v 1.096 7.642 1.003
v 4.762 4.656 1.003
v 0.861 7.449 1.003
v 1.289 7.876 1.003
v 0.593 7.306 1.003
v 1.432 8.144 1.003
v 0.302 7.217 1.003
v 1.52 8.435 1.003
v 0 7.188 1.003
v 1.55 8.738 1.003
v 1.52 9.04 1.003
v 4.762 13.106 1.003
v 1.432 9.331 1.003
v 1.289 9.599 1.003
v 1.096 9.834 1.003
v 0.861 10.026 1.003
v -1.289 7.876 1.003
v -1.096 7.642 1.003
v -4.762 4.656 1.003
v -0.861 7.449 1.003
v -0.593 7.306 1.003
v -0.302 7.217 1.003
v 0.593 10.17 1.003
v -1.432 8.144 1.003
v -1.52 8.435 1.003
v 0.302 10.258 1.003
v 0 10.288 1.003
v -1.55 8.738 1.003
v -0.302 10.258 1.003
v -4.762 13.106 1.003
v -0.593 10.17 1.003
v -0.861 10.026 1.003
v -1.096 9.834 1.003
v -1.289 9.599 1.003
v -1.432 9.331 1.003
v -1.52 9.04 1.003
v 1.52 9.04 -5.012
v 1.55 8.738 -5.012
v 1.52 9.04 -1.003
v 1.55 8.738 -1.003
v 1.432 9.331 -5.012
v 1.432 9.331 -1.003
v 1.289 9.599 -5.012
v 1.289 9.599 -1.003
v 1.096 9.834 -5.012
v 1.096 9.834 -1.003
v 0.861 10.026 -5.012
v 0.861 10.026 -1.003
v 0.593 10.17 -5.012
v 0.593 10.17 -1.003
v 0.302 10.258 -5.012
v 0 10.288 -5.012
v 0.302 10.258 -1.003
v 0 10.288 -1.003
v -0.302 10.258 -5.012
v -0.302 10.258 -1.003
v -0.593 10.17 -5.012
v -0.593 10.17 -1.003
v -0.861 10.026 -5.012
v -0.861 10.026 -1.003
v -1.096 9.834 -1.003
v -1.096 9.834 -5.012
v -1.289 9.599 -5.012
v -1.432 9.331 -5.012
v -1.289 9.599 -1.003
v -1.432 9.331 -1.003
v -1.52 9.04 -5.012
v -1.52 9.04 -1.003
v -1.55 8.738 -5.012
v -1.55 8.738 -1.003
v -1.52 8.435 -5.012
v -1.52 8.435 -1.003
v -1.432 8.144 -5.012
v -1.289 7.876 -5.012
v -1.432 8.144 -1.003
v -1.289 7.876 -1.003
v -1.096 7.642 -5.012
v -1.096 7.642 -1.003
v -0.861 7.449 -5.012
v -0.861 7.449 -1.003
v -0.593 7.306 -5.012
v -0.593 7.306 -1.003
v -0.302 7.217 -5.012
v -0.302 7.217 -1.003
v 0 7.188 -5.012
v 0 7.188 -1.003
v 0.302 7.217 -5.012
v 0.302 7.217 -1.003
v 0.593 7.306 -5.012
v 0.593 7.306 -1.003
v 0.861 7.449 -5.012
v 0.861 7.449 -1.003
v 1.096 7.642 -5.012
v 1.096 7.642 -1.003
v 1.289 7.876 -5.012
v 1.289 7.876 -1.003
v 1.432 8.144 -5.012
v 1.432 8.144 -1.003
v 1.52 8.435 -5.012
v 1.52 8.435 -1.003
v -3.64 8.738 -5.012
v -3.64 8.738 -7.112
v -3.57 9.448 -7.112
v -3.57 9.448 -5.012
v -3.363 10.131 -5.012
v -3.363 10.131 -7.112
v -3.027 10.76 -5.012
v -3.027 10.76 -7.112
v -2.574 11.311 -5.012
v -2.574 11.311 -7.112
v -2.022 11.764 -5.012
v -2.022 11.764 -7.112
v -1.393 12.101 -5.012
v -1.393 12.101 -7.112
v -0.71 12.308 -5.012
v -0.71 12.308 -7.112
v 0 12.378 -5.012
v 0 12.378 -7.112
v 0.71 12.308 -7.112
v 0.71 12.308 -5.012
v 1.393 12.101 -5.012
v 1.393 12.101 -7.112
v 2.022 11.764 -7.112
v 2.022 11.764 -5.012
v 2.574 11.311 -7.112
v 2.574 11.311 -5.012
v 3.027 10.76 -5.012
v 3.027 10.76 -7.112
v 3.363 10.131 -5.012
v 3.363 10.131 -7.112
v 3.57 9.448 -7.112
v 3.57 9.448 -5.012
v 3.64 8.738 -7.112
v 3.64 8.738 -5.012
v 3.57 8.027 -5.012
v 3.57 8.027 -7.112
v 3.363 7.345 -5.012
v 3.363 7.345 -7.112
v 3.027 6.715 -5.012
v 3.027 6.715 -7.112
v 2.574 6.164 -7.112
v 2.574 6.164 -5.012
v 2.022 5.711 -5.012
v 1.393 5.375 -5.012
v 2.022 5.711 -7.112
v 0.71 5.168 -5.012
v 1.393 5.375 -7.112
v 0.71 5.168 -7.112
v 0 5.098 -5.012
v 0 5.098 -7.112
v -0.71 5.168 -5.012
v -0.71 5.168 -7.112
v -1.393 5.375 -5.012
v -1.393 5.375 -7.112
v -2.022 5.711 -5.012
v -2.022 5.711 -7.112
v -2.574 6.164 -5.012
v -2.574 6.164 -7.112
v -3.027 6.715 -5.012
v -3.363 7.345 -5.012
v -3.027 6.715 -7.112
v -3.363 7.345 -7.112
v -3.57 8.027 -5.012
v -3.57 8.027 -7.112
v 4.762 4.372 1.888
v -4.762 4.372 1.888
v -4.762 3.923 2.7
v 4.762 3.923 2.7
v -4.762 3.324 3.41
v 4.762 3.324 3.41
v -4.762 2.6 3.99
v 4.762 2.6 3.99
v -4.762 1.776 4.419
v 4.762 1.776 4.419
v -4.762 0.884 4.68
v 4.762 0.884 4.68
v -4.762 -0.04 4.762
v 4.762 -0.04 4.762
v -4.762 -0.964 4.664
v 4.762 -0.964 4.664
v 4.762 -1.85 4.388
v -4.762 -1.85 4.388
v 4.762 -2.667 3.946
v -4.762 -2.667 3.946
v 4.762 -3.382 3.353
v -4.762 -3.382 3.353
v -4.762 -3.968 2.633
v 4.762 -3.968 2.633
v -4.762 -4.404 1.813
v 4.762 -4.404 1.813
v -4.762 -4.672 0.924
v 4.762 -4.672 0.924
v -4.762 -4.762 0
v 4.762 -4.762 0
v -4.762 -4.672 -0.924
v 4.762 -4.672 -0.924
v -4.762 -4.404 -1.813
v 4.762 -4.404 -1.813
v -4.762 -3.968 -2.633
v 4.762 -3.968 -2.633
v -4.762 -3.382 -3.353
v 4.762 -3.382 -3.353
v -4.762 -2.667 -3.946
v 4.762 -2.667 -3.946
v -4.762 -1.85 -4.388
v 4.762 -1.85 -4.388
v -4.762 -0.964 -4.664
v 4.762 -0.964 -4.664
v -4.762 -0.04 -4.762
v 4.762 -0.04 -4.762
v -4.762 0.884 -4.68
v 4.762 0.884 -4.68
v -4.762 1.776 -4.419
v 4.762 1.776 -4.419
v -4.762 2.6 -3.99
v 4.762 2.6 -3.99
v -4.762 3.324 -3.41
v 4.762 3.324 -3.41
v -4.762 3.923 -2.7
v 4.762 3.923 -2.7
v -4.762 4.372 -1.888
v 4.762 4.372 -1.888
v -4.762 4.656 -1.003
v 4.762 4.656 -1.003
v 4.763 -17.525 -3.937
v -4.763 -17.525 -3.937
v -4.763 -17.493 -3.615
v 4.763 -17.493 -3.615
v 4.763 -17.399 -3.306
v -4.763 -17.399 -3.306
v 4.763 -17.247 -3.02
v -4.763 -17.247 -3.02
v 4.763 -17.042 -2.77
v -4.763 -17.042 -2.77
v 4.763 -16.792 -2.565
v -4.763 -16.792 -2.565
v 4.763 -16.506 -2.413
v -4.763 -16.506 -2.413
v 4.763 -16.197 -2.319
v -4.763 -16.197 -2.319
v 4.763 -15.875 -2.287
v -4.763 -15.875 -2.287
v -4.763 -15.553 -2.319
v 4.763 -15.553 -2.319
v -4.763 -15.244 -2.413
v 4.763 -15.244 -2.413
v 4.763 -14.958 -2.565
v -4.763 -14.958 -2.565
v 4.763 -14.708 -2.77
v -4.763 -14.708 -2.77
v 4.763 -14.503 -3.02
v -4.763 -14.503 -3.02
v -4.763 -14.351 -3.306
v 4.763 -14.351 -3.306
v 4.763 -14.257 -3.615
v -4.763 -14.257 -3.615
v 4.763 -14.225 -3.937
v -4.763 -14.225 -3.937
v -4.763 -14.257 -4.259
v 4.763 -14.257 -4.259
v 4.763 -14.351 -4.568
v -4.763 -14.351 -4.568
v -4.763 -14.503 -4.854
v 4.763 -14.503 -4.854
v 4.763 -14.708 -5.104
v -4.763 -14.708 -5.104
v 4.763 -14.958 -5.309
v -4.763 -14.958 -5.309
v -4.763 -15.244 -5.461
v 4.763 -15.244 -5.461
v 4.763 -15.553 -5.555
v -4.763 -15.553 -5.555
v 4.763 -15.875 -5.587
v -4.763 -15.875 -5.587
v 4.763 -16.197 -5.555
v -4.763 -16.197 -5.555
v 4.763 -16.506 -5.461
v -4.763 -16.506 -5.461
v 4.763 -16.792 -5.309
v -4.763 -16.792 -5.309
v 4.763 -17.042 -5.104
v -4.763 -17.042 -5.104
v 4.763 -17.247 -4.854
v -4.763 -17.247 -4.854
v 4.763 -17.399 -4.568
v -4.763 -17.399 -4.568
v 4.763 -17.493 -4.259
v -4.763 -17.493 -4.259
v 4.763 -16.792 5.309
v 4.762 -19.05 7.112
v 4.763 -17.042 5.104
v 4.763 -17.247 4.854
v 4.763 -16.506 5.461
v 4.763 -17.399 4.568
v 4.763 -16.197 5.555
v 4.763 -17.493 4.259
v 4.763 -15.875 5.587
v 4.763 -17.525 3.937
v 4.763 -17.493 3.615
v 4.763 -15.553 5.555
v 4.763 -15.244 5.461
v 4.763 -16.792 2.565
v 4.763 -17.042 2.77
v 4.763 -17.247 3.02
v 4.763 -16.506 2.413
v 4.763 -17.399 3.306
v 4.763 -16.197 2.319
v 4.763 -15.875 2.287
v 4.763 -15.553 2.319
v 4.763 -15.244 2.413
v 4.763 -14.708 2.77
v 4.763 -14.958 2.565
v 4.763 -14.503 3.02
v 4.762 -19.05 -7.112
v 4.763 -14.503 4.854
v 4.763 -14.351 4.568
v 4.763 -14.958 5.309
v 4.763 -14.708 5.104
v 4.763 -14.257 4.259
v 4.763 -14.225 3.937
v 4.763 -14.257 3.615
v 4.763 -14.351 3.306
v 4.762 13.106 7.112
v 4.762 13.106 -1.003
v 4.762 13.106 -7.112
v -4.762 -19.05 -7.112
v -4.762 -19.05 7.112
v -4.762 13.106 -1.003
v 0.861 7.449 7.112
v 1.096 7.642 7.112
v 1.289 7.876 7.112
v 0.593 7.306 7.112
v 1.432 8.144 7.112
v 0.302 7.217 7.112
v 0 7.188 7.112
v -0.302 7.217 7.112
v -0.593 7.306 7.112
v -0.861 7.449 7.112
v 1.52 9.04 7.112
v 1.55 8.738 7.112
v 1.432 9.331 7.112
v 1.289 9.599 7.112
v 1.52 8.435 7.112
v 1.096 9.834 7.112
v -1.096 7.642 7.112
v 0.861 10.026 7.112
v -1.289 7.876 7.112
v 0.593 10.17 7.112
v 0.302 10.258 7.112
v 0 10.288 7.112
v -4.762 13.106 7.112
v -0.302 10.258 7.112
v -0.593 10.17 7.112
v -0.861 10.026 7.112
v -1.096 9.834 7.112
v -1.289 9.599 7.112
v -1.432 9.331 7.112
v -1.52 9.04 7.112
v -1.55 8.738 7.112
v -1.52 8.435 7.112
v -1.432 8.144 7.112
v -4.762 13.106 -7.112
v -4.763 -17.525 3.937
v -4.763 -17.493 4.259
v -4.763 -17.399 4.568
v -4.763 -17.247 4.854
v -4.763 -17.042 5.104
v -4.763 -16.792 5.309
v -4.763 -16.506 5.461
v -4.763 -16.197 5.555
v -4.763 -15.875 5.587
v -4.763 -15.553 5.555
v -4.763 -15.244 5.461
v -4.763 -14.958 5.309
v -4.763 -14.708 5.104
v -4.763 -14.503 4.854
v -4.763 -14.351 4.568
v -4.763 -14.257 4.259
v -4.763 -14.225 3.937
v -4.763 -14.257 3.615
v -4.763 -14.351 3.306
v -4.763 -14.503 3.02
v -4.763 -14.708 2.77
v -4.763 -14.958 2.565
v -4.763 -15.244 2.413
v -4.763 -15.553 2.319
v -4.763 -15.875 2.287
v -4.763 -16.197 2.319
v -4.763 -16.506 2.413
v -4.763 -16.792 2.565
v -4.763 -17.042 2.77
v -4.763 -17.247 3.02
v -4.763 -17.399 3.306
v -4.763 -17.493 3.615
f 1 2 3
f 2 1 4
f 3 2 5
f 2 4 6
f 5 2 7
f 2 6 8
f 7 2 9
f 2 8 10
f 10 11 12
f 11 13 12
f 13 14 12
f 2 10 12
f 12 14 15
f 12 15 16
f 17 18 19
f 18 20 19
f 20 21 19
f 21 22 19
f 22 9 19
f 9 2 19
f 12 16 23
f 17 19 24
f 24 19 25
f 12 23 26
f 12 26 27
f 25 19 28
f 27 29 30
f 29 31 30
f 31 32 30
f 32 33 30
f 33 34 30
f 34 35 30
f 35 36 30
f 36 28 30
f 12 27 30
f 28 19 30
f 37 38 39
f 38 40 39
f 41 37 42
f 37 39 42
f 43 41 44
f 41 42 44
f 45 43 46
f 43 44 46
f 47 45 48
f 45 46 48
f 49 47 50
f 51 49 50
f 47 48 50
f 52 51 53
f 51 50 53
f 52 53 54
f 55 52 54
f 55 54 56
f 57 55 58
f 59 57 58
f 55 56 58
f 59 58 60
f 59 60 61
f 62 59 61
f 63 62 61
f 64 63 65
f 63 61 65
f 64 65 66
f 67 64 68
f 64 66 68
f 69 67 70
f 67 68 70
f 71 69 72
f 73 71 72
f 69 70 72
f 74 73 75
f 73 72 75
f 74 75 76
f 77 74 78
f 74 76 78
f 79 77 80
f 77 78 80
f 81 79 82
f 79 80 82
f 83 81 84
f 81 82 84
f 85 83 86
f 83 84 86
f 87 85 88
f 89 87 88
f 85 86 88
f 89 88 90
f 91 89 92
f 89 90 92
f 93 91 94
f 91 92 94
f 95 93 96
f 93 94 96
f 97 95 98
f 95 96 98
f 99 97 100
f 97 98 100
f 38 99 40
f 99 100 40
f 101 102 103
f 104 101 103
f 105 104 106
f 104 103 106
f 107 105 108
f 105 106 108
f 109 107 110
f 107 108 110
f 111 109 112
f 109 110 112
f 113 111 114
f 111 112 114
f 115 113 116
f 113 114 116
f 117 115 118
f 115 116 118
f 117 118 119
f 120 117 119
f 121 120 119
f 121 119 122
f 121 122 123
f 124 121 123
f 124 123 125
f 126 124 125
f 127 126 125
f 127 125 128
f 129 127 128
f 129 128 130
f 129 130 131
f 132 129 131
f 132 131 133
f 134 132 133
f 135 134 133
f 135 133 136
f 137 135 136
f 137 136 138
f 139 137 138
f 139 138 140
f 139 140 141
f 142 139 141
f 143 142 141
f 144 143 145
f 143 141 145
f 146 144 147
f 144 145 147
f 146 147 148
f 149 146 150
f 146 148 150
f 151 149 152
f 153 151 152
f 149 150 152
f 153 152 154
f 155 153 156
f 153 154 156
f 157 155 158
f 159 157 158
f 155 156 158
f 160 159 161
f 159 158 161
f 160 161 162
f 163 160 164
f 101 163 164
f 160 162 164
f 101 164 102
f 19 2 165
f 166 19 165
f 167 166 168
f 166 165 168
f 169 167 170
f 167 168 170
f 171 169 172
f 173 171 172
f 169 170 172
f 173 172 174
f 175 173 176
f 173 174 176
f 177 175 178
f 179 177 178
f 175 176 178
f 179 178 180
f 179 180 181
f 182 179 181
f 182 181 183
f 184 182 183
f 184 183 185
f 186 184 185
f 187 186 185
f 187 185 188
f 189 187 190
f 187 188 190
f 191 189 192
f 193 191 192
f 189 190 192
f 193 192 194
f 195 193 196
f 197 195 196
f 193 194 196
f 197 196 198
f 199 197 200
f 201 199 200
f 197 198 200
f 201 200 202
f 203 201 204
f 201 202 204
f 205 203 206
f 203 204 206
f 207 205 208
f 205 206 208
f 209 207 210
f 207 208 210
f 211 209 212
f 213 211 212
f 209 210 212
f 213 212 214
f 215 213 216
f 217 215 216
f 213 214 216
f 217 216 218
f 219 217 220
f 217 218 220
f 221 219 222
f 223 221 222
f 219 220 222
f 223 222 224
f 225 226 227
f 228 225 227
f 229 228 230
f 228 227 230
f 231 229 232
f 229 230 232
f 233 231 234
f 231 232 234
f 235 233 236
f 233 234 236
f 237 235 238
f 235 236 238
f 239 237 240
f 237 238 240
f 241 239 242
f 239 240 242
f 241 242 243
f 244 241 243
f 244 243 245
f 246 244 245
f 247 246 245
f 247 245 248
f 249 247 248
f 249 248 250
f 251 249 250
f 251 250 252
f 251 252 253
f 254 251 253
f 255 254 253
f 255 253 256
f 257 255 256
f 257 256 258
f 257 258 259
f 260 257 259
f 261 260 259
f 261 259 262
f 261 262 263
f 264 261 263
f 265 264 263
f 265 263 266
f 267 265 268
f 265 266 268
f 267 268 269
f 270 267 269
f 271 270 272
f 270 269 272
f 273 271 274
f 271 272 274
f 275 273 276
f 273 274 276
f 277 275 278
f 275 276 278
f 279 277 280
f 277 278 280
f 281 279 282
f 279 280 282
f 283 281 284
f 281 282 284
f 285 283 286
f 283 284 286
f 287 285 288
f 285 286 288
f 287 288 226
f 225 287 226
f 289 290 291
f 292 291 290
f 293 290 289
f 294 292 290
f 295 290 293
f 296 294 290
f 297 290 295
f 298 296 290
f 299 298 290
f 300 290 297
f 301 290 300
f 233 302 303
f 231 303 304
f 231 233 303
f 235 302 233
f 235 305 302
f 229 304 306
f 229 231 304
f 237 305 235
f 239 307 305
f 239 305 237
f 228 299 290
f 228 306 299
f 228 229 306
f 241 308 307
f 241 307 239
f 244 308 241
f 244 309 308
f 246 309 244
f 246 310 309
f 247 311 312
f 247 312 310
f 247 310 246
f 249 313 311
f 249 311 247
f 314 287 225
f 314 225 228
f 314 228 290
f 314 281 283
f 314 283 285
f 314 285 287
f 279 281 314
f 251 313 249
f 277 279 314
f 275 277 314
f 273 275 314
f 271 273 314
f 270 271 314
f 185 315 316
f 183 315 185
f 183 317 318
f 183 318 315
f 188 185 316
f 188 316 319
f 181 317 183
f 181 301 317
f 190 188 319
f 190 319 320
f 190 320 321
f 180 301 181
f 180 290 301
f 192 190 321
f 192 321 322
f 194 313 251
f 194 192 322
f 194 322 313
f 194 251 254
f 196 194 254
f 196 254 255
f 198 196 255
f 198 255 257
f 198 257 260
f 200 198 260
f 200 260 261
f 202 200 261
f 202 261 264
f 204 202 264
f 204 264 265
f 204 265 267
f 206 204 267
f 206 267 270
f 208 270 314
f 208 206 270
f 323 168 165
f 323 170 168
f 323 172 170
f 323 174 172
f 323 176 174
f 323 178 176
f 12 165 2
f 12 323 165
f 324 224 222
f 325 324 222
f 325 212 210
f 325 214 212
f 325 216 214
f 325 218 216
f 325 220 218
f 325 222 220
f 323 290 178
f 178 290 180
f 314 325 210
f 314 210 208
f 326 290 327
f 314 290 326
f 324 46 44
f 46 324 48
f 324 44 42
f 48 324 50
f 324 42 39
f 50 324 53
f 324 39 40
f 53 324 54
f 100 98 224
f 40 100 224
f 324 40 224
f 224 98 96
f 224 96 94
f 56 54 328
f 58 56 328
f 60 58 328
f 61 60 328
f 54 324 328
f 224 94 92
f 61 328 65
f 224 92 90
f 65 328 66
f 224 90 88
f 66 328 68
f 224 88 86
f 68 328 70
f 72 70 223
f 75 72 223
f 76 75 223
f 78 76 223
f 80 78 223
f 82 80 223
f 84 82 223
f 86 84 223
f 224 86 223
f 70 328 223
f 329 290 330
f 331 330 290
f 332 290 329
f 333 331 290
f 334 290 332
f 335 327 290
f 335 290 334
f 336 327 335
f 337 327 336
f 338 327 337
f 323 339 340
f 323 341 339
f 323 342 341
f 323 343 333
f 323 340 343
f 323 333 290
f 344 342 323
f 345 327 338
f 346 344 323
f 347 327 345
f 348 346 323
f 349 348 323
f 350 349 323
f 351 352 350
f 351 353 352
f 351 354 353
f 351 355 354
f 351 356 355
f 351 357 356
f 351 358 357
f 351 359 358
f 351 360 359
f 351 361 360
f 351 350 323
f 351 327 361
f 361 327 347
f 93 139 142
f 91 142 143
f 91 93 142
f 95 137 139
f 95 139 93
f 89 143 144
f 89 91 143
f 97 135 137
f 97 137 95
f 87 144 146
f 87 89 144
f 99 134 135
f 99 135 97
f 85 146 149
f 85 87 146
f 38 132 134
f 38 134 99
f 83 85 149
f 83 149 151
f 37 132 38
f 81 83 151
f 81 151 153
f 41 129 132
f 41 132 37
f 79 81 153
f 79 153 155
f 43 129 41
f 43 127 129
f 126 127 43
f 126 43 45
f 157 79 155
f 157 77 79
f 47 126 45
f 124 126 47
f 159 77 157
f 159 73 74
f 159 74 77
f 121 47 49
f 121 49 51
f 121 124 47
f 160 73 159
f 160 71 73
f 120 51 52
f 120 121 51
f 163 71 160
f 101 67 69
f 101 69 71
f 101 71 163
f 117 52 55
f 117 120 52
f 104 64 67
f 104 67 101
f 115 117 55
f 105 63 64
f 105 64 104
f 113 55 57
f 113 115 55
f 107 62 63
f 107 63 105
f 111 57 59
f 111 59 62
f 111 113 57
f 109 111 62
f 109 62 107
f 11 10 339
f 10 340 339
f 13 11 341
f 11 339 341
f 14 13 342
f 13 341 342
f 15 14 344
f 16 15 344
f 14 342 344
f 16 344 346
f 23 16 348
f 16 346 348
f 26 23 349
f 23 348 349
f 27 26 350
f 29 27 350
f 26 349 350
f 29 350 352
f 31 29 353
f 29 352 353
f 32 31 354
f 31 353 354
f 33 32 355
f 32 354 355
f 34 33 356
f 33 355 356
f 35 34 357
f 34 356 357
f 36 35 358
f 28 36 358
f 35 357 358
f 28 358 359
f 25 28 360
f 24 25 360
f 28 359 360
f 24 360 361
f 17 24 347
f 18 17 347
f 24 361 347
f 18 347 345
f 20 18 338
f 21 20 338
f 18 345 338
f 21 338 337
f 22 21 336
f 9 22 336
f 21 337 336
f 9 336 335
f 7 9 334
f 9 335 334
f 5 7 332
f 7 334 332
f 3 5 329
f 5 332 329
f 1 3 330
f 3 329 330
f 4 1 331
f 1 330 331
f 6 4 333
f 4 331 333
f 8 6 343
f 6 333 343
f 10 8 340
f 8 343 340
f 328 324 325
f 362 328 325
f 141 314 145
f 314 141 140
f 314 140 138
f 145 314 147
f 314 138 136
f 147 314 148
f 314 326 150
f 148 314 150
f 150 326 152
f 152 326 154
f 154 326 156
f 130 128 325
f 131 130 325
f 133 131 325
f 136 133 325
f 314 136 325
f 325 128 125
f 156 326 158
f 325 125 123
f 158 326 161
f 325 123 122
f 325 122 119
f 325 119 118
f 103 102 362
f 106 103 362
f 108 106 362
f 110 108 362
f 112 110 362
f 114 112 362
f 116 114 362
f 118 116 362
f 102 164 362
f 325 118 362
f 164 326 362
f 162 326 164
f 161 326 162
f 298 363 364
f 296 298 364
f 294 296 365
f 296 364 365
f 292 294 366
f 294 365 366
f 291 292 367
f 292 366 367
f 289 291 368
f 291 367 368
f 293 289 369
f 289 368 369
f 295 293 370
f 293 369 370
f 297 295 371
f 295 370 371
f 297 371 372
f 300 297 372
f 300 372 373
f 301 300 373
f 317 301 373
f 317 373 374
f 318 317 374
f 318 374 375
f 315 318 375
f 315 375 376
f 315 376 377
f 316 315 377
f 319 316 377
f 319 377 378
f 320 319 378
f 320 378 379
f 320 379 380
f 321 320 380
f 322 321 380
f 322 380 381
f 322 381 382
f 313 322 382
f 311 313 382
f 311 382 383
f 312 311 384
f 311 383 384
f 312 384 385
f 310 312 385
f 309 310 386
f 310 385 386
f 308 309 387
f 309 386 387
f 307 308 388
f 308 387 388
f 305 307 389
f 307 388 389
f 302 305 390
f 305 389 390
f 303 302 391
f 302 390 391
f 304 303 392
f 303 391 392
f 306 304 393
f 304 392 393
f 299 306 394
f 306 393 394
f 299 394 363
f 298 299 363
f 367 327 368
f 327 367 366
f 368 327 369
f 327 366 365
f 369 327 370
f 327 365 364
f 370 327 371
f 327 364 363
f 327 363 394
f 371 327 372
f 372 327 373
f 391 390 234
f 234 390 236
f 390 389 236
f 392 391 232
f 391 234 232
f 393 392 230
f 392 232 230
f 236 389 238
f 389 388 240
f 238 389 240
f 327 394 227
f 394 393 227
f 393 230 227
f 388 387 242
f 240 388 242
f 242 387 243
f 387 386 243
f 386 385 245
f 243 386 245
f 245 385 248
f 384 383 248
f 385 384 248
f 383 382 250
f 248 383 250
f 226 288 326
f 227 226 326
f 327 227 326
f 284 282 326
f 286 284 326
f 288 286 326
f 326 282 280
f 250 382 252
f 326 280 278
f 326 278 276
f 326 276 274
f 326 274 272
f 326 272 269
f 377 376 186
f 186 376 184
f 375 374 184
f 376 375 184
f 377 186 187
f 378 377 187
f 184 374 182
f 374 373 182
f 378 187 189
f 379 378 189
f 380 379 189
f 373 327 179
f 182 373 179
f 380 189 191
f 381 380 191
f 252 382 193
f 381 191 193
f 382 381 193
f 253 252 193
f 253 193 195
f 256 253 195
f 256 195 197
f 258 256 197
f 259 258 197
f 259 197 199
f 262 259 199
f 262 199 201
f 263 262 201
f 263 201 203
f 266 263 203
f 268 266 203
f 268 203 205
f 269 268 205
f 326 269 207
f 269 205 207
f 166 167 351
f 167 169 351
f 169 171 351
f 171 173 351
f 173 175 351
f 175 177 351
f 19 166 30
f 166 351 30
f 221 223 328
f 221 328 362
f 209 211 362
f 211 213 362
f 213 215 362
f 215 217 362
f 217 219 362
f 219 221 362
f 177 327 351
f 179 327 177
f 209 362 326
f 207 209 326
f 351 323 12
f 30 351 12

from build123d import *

# Parameters (mm, degrees)
SKETCH1_W                                          = 31.75
SKETCH1_H                                          = 32.1564
BOSS_EXTRUDE1_DEPTH                                = 9.525
SKETCH2_W                                          = 8.763
SKETCH2_H                                          = 32.1564
CUT_EXTRUDE1_DEPTH                                 = 27.563955842
CUT_EXTRUDE2_DEPTH                                 = 27.563955842
SKETCH4_W                                          = 8.763
SKETCH4_H                                          = 32.16
CUT_EXTRUDE3_DEPTH                                 = 27.563955842
SKETCH5_W                                          = 9.525
SKETCH5_H                                          = 4.7625
SKETCH6_W                                          = 1.3208
SKETCH6_H                                          = 6.1087
CBORE_FOR_M2_5_HEX_HEAD_MACHINE_SCREW1_D           = 3.1
CBORE_FOR_M2_5_HEX_HEAD_MACHINE_SCREW1_CBORE_D     = 7.28
CBORE_FOR_M2_5_HEX_HEAD_MACHINE_SCREW1_CBORE_DEPTH = 2.1
M4X0_7_TAPPED_HOLE1_D                              = 3.3


with BuildPart() as part:
    # Sketch1 → Boss-Extrude1 (new body)
    with BuildSketch(Plane(origin=(4.7625, 0, 0), x_dir=(0, 0, -1), z_dir=(1, 0, 0))):
        with Locations((0, -2.9718)):
            Rectangle(SKETCH1_W, SKETCH1_H)
    extrude(amount=-BOSS_EXTRUDE1_DEPTH)

    # Sketch2 → Cut-Extrude1 (cut, through all)
    with BuildSketch(Plane.ZY.offset(4.7625)):
        with Locations((-11.4935, -2.9718)):
            Rectangle(SKETCH2_W, SKETCH2_H)
    extrude(amount=-CUT_EXTRUDE1_DEPTH, mode=Mode.SUBTRACT)

    # Sketch3 → Cut-Extrude2 (cut, through all)
    with BuildSketch(Plane.ZY.offset(4.7625)):
        with BuildLine():
            Line((1.0033, 13.1064), (-1.0033, 13.1064))
            Line((-1.0033, 13.1064), (-1.0033, 4.655619761))
            ThreePointArc((-1.0033, 4.655619761), (0, 4.7625), (1.0033, 4.655619761))
            Line((1.0033, 4.655619761), (1.0033, 13.1064))
        make_face()
    extrude(amount=-CUT_EXTRUDE2_DEPTH, mode=Mode.SUBTRACT)

    # Sketch4 → Cut-Extrude3 (cut, through all)
    with BuildSketch(Plane.ZY.offset(4.7625)):
        with Locations((11.4935, -2.9736)):
            Rectangle(SKETCH4_W, SKETCH4_H)
    extrude(amount=-CUT_EXTRUDE3_DEPTH, mode=Mode.SUBTRACT)

    # Sketch5 → Cut-Revolve1 (revolve, cut)
    with BuildSketch(Plane.XY):
        with Locations((0, 2.38125)):
            Rectangle(SKETCH5_W, SKETCH5_H)
    revolve(axis=Axis((-4.7625, 0, 0), (1, 0, 0)), mode=Mode.SUBTRACT)

    # Sketch6 → Hole1 (revolve, cut)
    with BuildSketch(Plane(origin=(0, 8.7376, 1.0033), x_dir=(0, 1, 0), z_dir=(1, 0, 0))):
        with Locations((0.6604, 3.05435)):
            Rectangle(SKETCH6_W, SKETCH6_H)
    revolve(axis=Axis((0, 8.7376, 111.0033), (0, 0, -1)), mode=Mode.SUBTRACT)

    # CBORE for M2.5 Hex Head Machine Screw1 (through all)
    with Locations(Plane(origin=(0, 0, -7.112), x_dir=(-1, 0, 0), z_dir=(0, 0, -1))):
        with Locations((0, 8.7376)):
            CounterBoreHole(CBORE_FOR_M2_5_HEX_HEAD_MACHINE_SCREW1_D / 2, CBORE_FOR_M2_5_HEX_HEAD_MACHINE_SCREW1_CBORE_D / 2, CBORE_FOR_M2_5_HEX_HEAD_MACHINE_SCREW1_CBORE_DEPTH)

    # M4x0.7 Tapped Hole1 (through all)
    with Locations(Plane(origin=(4.7625, -17.4625, 0), x_dir=(0, 1, 0), z_dir=(1, 0, 0))):
        with Locations((1.5875, -3.937), (1.5875, 3.937)):
            Hole(M4X0_7_TAPPED_HOLE1_D / 2)


solid = part.part
